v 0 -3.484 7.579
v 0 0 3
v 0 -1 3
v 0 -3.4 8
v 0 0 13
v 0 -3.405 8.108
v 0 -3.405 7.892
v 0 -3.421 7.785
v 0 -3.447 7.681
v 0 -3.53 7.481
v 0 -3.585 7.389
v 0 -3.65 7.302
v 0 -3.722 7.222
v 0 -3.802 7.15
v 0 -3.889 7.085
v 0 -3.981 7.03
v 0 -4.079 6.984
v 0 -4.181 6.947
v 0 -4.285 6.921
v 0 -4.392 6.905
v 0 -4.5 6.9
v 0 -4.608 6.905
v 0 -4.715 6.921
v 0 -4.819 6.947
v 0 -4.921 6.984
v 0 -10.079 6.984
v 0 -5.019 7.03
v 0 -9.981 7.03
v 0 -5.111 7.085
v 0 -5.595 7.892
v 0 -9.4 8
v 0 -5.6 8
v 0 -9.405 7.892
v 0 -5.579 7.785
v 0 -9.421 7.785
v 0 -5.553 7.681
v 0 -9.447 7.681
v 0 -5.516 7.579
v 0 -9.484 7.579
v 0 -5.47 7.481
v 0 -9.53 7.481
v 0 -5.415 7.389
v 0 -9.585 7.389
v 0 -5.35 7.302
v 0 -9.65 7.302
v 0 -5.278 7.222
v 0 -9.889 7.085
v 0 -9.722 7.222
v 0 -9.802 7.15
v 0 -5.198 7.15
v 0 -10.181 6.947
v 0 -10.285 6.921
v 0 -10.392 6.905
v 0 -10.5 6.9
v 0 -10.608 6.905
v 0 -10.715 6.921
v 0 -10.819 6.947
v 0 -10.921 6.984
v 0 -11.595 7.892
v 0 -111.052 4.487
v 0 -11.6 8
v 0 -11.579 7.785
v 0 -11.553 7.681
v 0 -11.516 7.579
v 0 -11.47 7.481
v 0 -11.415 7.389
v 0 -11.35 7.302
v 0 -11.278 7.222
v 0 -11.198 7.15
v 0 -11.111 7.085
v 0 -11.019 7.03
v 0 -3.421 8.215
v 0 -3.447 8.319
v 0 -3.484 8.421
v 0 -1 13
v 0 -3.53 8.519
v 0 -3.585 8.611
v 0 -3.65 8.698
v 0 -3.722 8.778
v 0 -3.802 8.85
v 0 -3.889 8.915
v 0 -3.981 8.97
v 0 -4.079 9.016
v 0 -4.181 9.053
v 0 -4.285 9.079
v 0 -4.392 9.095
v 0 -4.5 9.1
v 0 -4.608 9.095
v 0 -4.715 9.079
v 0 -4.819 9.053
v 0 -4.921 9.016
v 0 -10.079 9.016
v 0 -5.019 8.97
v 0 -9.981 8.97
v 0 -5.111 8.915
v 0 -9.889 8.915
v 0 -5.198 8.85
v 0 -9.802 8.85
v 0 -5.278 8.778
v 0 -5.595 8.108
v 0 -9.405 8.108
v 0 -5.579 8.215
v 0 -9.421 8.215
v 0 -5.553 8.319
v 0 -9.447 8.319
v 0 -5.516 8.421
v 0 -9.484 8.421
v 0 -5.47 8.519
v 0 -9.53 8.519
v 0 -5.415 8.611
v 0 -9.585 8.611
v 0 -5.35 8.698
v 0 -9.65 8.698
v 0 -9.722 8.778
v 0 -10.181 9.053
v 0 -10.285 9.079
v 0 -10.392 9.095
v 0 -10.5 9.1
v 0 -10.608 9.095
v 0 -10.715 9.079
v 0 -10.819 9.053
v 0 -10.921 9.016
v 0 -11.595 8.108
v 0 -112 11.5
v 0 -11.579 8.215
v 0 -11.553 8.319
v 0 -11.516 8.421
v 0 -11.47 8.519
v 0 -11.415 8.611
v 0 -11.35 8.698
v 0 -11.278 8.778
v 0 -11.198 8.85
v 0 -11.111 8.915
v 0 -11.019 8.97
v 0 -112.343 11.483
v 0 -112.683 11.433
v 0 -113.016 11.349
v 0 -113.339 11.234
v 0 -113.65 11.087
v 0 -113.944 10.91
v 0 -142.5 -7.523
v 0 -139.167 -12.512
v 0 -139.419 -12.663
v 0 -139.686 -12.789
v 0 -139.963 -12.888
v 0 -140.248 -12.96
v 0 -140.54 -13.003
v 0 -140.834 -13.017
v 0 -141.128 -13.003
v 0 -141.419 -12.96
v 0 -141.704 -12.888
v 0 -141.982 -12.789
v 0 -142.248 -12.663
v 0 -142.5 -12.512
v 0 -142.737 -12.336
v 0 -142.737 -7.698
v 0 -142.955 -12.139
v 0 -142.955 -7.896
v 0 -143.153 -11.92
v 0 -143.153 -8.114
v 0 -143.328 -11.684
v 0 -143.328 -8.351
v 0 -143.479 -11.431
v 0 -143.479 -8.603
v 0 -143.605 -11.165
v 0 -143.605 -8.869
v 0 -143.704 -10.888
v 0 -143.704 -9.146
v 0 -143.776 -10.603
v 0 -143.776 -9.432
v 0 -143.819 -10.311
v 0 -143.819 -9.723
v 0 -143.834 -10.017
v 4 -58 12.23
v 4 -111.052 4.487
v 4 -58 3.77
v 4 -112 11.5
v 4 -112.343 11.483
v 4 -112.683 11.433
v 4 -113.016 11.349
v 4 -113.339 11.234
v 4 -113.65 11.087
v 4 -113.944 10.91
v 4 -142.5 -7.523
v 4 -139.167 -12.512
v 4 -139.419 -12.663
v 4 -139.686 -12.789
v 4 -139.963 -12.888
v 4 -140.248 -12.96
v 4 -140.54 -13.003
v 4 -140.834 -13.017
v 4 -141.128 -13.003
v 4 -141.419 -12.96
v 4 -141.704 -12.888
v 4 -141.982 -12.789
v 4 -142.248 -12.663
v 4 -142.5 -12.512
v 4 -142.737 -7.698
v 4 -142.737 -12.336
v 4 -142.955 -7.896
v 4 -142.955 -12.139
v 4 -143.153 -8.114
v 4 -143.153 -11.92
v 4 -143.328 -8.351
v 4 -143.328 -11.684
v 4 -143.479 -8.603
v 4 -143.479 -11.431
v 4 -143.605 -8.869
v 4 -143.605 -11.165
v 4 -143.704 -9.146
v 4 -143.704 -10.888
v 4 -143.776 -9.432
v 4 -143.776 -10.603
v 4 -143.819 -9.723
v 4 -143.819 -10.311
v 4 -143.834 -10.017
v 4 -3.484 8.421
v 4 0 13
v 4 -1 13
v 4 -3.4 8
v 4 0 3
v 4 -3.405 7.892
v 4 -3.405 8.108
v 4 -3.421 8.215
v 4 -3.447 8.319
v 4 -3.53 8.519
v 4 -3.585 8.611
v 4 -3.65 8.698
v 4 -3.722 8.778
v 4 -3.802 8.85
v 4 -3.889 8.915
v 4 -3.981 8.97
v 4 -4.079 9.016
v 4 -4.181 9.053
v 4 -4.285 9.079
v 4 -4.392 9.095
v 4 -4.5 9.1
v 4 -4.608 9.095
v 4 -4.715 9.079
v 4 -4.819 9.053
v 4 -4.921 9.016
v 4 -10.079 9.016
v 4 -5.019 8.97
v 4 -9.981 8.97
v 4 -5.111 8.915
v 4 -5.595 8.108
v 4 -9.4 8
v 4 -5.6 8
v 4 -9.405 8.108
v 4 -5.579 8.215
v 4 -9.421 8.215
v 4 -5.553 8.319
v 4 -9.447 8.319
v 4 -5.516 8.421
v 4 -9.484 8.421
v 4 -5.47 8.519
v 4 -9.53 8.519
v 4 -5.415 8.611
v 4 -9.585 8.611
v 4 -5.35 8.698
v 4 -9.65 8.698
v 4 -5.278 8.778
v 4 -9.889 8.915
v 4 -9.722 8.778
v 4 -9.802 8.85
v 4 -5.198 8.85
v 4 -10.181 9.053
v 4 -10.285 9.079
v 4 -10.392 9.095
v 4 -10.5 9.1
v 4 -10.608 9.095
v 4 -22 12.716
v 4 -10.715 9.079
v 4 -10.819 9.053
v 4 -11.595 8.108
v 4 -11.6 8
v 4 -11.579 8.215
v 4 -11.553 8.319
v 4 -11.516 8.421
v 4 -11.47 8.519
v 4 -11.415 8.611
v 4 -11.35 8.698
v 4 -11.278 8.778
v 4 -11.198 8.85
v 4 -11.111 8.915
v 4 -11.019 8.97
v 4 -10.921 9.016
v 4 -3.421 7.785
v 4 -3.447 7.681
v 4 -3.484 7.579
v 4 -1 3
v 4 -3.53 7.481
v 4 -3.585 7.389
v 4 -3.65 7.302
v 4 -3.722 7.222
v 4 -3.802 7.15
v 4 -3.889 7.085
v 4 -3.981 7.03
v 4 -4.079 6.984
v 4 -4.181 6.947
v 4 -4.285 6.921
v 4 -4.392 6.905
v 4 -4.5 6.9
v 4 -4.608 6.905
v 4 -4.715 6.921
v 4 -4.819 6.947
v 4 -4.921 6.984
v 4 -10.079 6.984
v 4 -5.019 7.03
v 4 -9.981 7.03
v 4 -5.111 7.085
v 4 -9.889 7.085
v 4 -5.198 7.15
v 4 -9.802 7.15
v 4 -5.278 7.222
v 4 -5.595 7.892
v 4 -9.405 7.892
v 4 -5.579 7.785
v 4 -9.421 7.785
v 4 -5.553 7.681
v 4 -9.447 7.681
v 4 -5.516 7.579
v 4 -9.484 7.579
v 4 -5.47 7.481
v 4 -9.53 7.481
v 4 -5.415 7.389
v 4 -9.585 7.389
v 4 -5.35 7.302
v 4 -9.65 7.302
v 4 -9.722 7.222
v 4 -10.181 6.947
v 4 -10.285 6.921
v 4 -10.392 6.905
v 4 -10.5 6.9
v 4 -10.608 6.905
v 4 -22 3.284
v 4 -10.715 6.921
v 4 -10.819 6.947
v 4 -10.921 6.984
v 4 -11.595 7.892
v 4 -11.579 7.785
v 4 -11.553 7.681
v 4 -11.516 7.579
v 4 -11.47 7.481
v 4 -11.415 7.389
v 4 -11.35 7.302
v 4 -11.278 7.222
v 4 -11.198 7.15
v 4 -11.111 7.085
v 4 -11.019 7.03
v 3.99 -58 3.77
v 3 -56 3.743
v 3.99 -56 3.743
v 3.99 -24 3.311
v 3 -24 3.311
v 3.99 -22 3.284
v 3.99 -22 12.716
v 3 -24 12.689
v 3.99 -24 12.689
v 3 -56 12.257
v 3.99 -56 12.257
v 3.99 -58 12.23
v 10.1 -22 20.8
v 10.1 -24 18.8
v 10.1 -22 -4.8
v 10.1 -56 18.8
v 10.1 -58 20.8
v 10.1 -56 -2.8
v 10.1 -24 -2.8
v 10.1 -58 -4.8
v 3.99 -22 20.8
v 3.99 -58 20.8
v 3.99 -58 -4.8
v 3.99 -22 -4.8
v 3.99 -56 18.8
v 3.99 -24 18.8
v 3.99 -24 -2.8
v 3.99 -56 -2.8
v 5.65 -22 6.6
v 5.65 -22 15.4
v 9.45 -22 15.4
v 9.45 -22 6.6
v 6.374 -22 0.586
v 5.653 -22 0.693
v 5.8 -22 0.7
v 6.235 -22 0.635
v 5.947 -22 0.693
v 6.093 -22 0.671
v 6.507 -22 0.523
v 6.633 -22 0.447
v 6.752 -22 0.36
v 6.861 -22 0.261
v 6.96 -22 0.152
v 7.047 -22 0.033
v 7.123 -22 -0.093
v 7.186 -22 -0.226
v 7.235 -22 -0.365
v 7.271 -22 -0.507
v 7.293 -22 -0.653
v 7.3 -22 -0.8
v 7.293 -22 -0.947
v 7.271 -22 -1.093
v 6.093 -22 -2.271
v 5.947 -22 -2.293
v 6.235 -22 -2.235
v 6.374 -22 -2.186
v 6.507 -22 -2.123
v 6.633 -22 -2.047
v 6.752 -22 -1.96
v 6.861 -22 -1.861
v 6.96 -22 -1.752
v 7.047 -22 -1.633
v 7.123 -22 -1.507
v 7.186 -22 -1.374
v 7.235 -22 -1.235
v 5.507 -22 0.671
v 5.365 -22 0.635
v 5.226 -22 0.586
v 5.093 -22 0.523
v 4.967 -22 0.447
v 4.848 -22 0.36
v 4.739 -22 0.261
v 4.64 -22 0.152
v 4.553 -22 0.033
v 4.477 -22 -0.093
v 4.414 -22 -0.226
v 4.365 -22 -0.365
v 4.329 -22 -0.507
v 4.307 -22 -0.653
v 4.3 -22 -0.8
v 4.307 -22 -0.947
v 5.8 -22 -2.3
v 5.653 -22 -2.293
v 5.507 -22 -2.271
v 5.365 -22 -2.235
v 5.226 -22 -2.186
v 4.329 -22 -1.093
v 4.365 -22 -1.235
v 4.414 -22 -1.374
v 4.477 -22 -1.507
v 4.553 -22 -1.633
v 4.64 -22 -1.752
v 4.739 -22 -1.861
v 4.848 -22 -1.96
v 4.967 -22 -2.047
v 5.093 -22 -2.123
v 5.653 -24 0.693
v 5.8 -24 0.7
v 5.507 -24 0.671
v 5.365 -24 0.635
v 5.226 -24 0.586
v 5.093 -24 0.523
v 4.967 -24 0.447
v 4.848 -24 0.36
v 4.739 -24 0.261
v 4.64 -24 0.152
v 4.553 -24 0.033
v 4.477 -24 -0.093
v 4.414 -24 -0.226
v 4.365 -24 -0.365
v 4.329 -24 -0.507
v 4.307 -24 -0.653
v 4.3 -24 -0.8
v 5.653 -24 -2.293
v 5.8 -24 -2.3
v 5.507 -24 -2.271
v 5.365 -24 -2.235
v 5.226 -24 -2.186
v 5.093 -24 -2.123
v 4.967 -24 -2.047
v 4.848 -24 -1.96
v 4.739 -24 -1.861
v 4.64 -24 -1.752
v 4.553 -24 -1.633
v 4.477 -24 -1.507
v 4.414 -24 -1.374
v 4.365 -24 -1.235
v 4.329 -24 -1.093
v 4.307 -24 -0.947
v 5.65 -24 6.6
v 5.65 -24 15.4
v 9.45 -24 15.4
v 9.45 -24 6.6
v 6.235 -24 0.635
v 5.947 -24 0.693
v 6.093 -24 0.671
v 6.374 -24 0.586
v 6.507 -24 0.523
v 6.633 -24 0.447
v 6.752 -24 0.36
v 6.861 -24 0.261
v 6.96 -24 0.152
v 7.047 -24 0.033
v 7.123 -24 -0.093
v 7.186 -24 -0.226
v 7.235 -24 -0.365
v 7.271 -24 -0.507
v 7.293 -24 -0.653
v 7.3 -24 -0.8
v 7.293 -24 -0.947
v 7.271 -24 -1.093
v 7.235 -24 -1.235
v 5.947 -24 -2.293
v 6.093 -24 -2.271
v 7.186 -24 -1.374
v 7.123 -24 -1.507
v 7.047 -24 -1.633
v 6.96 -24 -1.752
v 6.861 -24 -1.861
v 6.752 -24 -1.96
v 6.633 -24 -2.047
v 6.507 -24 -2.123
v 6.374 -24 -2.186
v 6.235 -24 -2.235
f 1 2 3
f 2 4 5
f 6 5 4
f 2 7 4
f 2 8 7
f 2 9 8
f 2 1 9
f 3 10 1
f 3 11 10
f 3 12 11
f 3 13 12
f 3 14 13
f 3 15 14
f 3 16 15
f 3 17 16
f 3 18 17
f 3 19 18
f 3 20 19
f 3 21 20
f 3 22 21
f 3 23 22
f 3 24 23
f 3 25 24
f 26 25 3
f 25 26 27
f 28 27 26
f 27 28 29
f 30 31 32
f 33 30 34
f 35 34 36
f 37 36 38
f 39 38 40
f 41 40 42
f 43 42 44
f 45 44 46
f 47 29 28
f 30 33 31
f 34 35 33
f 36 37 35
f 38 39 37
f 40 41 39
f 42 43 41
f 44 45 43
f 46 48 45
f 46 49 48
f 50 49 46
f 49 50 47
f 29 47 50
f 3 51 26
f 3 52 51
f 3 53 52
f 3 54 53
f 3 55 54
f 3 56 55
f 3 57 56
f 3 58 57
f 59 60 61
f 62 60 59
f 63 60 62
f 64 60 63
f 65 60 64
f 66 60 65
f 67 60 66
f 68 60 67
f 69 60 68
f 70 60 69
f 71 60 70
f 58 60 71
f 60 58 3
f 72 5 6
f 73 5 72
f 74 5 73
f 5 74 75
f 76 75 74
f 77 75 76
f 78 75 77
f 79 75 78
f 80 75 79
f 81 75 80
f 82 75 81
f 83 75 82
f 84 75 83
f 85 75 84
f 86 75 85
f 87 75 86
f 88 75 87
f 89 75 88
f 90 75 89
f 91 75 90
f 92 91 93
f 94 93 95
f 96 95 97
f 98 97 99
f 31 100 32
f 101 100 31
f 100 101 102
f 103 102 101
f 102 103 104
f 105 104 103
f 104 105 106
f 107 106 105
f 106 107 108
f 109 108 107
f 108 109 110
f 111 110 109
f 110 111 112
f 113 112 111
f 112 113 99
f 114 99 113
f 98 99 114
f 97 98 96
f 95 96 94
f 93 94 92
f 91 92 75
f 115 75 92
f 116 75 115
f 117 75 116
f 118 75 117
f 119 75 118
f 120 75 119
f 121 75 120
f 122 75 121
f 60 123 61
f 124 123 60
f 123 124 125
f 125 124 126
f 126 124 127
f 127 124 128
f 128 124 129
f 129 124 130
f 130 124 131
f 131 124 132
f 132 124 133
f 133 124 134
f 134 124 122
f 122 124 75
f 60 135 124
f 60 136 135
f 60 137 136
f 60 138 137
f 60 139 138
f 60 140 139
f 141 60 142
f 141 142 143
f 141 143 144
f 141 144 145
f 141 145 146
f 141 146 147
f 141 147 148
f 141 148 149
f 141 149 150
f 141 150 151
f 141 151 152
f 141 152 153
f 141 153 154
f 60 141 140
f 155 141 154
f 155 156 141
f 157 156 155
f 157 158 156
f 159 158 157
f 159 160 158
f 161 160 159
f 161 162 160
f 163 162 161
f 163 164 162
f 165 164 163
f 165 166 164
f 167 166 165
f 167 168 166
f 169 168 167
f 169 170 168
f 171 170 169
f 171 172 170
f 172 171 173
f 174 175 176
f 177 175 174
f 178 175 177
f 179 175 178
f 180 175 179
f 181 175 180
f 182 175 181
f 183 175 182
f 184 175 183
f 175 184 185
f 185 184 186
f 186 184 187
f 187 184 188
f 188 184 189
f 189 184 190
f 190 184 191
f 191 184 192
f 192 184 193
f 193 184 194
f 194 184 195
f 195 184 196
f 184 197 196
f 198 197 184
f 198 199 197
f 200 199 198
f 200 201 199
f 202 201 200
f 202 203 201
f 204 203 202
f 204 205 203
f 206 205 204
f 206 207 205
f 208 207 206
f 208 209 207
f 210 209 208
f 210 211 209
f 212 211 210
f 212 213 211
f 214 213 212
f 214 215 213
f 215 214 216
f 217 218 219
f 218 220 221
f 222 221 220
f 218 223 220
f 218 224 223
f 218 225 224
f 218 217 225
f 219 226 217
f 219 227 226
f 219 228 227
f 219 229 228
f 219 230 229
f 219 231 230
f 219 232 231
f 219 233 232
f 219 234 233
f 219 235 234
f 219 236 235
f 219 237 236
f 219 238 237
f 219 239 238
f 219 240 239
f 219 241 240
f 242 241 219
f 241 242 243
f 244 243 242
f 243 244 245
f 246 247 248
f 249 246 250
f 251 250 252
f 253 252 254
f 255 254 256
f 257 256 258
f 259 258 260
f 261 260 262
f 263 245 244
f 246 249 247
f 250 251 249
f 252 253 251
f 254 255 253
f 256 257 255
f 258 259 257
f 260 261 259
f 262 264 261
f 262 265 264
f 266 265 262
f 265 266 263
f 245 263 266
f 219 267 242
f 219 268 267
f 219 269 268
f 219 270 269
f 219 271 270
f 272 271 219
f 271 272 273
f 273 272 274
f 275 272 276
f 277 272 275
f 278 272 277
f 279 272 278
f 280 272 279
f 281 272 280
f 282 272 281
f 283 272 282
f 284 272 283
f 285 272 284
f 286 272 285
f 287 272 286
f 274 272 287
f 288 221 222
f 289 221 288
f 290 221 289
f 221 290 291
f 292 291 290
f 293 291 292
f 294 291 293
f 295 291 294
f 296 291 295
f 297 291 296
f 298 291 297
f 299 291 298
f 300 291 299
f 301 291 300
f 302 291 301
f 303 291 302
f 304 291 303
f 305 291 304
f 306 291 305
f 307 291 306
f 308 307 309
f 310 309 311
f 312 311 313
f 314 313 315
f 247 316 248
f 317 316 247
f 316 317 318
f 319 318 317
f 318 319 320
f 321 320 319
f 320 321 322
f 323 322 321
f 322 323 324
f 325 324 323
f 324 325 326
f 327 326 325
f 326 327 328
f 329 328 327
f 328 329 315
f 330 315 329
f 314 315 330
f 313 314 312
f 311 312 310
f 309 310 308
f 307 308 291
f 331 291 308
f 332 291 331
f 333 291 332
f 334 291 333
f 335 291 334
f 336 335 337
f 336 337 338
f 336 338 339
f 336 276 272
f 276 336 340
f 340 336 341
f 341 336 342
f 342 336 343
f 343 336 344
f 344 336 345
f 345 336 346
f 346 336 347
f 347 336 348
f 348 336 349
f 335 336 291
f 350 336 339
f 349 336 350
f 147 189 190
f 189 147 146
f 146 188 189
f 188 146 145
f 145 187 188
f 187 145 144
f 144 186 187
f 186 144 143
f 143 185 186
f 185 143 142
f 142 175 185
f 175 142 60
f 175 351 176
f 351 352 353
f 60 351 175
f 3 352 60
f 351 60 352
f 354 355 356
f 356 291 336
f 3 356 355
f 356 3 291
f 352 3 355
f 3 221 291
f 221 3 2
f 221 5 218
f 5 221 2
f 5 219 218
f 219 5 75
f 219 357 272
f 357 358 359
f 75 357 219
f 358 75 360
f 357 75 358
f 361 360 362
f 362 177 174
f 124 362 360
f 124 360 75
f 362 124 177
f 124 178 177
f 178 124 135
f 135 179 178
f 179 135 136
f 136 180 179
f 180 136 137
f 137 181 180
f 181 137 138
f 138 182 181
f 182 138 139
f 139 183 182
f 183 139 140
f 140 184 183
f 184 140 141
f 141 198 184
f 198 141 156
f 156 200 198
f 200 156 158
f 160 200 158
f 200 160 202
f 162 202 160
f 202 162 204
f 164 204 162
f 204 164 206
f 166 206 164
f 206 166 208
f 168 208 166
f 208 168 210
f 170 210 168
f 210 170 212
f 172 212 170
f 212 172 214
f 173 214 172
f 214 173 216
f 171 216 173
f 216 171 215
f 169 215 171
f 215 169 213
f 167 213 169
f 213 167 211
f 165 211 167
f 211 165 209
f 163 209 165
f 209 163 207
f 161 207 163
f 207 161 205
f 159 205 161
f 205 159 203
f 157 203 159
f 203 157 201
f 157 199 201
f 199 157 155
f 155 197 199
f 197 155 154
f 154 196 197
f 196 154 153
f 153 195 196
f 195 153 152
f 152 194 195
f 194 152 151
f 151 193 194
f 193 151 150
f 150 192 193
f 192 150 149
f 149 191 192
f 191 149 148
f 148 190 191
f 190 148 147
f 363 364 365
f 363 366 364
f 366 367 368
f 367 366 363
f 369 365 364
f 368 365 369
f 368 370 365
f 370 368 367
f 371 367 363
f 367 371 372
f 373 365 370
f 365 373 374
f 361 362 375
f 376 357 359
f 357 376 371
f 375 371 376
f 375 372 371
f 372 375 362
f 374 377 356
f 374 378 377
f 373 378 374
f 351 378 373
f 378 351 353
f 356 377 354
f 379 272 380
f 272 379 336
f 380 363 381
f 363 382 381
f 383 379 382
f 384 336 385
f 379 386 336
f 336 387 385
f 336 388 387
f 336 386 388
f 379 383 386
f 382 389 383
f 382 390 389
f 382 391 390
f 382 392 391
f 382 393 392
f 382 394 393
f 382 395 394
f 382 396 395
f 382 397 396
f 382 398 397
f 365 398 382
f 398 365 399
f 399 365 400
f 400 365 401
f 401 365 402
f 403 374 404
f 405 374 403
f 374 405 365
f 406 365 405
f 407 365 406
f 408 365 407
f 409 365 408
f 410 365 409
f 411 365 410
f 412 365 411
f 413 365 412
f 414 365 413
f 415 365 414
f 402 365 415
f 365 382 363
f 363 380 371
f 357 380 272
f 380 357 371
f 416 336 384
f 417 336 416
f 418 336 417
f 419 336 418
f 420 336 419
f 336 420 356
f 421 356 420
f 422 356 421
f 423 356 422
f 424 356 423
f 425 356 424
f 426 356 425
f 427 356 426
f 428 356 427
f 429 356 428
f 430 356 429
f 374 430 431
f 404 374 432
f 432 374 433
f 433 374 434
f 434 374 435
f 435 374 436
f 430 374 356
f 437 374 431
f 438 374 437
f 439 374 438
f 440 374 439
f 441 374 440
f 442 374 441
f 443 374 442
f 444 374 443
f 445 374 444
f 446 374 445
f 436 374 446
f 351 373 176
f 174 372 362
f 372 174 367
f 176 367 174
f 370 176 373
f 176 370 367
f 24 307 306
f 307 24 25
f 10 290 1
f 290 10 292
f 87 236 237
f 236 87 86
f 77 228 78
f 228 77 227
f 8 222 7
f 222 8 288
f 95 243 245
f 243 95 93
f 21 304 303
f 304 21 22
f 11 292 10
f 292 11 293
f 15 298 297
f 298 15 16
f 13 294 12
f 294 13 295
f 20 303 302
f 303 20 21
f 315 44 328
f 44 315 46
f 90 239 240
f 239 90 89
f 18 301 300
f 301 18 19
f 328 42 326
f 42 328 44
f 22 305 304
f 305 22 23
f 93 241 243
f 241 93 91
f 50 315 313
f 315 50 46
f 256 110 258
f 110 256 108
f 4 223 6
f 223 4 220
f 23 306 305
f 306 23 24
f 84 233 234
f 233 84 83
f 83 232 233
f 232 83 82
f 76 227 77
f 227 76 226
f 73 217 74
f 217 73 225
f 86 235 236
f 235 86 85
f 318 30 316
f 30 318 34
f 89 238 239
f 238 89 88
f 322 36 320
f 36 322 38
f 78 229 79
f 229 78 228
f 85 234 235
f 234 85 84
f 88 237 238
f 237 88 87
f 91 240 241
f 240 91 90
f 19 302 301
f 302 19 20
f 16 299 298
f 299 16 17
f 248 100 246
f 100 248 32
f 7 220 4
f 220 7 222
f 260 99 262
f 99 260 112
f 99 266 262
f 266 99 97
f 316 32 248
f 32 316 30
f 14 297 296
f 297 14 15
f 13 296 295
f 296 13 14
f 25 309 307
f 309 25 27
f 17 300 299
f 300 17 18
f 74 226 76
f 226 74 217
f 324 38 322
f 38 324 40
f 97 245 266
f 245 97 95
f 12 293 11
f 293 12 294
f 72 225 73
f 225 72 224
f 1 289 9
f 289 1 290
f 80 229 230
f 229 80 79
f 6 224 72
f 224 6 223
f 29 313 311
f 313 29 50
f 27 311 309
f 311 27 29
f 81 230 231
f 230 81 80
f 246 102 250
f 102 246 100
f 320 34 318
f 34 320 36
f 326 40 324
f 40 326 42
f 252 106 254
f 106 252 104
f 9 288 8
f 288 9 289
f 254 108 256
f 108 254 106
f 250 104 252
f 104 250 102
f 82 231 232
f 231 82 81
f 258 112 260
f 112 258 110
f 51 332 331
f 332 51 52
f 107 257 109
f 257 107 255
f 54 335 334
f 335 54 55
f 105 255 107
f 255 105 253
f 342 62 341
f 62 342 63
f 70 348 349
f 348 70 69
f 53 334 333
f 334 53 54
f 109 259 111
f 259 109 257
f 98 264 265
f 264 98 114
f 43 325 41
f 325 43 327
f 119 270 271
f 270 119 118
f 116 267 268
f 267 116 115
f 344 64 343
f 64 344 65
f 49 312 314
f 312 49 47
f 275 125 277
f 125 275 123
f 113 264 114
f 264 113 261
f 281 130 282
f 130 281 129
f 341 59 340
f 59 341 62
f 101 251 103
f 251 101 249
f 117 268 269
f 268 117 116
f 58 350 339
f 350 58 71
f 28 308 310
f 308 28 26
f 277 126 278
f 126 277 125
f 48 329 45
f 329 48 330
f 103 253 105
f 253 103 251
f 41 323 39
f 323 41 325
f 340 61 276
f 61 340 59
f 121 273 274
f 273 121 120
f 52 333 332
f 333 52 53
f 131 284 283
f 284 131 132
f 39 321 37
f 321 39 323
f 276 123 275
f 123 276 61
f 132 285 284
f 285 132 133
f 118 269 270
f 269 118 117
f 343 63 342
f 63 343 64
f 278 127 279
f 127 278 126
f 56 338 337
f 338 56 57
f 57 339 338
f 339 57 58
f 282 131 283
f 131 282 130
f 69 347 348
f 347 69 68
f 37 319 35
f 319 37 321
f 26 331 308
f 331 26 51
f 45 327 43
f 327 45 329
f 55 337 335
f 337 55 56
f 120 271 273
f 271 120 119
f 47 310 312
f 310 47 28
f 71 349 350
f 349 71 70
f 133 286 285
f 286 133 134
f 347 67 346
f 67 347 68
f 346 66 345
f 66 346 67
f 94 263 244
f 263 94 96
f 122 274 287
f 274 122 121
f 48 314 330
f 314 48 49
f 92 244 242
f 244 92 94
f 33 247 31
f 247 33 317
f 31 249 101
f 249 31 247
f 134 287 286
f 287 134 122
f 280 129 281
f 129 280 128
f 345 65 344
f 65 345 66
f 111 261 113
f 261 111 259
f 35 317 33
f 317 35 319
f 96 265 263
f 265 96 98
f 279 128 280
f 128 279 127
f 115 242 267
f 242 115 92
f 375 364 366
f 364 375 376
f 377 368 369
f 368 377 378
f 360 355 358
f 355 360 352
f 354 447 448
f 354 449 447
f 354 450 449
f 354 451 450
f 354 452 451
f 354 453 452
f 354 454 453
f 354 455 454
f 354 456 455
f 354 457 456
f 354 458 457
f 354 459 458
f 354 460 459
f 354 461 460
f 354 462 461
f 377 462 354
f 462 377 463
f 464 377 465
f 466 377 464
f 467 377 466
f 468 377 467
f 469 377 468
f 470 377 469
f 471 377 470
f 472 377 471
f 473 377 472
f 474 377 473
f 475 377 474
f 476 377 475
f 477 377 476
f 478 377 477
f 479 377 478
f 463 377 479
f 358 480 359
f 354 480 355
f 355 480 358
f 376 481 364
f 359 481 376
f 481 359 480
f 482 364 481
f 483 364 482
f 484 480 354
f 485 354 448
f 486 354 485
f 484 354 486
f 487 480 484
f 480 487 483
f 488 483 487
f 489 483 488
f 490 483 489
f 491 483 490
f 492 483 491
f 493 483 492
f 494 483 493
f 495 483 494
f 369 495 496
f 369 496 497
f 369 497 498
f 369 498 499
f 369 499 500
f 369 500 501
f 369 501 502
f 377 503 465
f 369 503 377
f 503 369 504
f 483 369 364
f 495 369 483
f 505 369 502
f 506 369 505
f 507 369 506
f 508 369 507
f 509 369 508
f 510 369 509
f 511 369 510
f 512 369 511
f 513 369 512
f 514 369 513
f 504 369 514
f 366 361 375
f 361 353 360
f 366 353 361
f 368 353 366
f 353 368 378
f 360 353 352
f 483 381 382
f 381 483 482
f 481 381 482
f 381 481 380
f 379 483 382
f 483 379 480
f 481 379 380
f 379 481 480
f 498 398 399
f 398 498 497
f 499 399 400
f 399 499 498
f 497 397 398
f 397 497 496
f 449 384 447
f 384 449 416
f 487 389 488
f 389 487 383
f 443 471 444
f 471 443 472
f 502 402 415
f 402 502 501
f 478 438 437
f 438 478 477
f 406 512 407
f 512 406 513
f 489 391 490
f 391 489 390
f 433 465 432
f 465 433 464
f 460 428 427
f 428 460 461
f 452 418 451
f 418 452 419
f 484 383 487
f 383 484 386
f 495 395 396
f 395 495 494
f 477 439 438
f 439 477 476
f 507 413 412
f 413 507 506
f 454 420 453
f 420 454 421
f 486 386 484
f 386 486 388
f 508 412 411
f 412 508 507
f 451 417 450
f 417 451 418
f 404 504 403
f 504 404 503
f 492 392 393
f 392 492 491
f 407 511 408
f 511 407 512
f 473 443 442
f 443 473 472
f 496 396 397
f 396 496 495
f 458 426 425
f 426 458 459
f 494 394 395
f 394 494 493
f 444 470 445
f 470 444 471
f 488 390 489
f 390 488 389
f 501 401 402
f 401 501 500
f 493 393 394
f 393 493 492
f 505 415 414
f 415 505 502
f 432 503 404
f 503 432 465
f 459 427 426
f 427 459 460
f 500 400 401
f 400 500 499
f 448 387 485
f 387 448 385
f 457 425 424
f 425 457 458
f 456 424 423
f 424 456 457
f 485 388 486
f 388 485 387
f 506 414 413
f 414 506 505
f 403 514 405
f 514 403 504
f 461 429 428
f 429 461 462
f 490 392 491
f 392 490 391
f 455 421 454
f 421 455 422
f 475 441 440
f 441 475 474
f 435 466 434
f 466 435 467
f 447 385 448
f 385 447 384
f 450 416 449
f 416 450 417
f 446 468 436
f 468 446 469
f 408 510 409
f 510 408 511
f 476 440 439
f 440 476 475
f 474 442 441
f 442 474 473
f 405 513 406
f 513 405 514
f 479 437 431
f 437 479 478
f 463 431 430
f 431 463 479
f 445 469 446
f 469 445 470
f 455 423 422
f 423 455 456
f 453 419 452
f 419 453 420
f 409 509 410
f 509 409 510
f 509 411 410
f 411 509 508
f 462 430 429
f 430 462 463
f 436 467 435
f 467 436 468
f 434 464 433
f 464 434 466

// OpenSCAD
// file: lib.scad
// Small helpers shared by the parts.

module rounded_square(w, h, r) {
  r2 = min(r, w / 2 - 0.01, h / 2 - 0.01);
  offset(r = r2) square([w - 2 * r2, h - 2 * r2], center = true);
}

// A plate in the x-z plane between y = y0 and y = y0 + t, from a 2D shape drawn in (x, z).
module xz_plate(y0, t) {
  translate([0, y0 + t, 0]) rotate([90, 0, 0]) linear_extrude(t) children();
}

// A plate in the y-z plane between x = x0 and x = x0 + t, from a 2D shape drawn in (y, z).
module yz_plate(x0, t) {
  translate([x0, 0, 0]) rotate([90, 0, 90]) linear_extrude(t) children();
}

// A round hole along x whose top is pointed (45 degrees, cut flat 1 mm above the circle) toward
// +dir so it prints without supports when that axis points up: dir = "y" or "z".
module teardrop_x(d, len, dir = "y") {
  rotate([0, 90, 0]) linear_extrude(len, center = true)
    rotate([0, 0, dir == "y" ? 90 : 0])  // 2D +x below ends up along +dir
      intersection() {
        union() {
          circle(d = d);
          rotate([0, 0, -45]) square(d / 2); // the point, toward 2D +x
        }
        translate([-d, -d]) square([2 * d, 2 * d]);
        translate([-d, -d]) square([d / 2 + 1 + d, 2 * d]);
      }
}
// file: params.scad
// Shared dimensions for the DIY "Reality is yours" glasses. Everything is in mm.
// Wearer coordinates: x = to the wearer's right (+), y = forward toward the world (+), z = up (+).
// The frame front sits between y = 0 (back face, toward the eyes) and y = frame_t; the eyes are
// ~14 mm behind y = 0; the right eye's axis is the line x = ipd/2, z = 0.
//
// Measure your own parts and change these before printing. The ones you should check are marked
// MEASURE; the rest are design choices.

$fn = 64;
clear = 0.3;          // fit clearance for parts that slide into each other (tune for your printer)
m2_hole = 2.2;        // through hole for an M2 screw
m2_tap = 1.7;         // hole an M2 screw self-taps into (plastic)

// ---- face ----
ipd = 63;             // MEASURE: your pupil distance (a ruler in a mirror, or an optician's number)
frame_half_w = 71;    // half the frame width; the temples sit at +-frame_half_w (MEASURE: head width / 2 at the temples, minus 2)
frame_t = 5;          // frame thickness (front to back)

// ---- rims (open; no lenses) ----
rim_w = 40;           // opening width
rim_h = 32;           // opening height
rim_cx = ipd / 2 + 4; // rim center (x): a little outboard of the pupil, as in ordinary glasses
rim_bar = 4.5;        // rim border width
rim_r = 8;            // opening corner radius
rim_outer_w = rim_w + 2 * rim_bar;
rim_outer_h = rim_h + 2 * rim_bar;
bridge_gap = 2 * rim_cx - rim_outer_w;  // space between the rims at the nose (the bridge spans it)
nose_top_w = 16;      // nose notch width at its top (z = nose_top_z)
nose_top_z = 2;
nose_bot_w = 26;      // and at the bottom edge of the frame

// ---- nose pads (printed on the back of the frame) ----
pad_depth = 9;        // how far the pads reach back toward the face
pad_z = -12;          // pad height relative to the eye line

// ---- temples ----
temple_t = 4;         // thickness (x)
temple_h = 10;        // height (z) at the front
temple_z = 8;         // temple centerline height (z)
temple_len = 112;     // straight part, from the frame back face to the ear (MEASURE: frame to the top of your ear)
temple_drop_len = 34; // part that bends down behind the ear
temple_drop_deg = 32;
joint_len = 14;       // how far the frame's joint block reaches back
joint_w = 5;          // joint block width (x)
joint_holes_y = [-4.5, -10.5]; // M2 screw positions along the joint (y)

// ---- wire channel (battery on the left temple -> electronics on the right) ----
wire_w = 2.6;
wire_d = 2;

// ---- optics: OLED -> lens -> 45 degree beam splitter -> right eye ----
// The display faces the nose (-x) on the outer side of the right eye; the splitter in front of the
// eye reflects it back toward the eye (-y) while the world shows through it. One reflection mirrors
// the picture left-right: the firmware flips it (MIRROR_X in config.h).
lens_d = 25;              // MEASURE: lens diameter (Google Cardboard lenses are 25 mm, f ~45 mm)
split_y = frame_t + 2 + lens_d / 2 + 1.5; // optical axis (y): splitter center, lens center, display center
split_w = 25.4;           // MEASURE: beam splitter plate width (the 45 degree side)
split_h = 25.4;           // MEASURE: plate height
split_t = 1.1;            // MEASURE: plate thickness
lens_f = 45;              // MEASURE: lens focal length
lens_edge = 3.5;          // MEASURE: lens edge thickness
lens_gap = 14;            // splitter center -> lens center (x)
// Display -> lens distance: a bit under the focal length puts the picture ~1 m away. The display
// carrier slides +-6 mm around this for focusing.
disp_dist = lens_f * 1000 / (lens_f + 1000);
disp_pcb_w = 44.5;        // MEASURE: display module PCB width (horizontal, along y)
disp_pcb_h = 37.0;        // MEASURE: display module PCB height (z)
disp_pcb_t = 1.6;
disp_active = 27.0;       // MEASURE: visible area (square, 1.5" 128x128 SSD1351)
disp_active_dy = 0;       // MEASURE: visible area center offset from the PCB center (y)
disp_active_dz = 0;       // MEASURE: visible area center offset from the PCB center (z)
disp_parts_t = 5;         // MEASURE: tallest part on the back of the display PCB (pin header etc.)

// ---- lens housing (in front of the right eye; screws to the frame front) ----
wall = 2;
house_x0 = ipd / 2 - split_w / (2 * sqrt(2)) - 2.5 - wall; // nose-side wall
lens_x = ipd / 2 + lens_gap;                     // lens center (x)
house_y0 = frame_t;                              // sits on the frame front
house_y1 = split_y + max(split_w / (2 * sqrt(2)) + 3, lens_d / 2 + 3.4); // front edge
house_hz = rim_outer_h / 2;                      // half height (z), same as the rims
join_x = frame_half_w + 2;                       // where the lens housing meets the display box
lens_plate_t = lens_edge + 3;                    // lens plate thickness (x): 1.5 mm lip + lens + 1.5 mm ring
light_hole = 28;                                 // square light opening between housing and display box
// Frame screw positions (x, z) for the lens housing, clear of the light path (|z| > 14 there).
housing_holes = [[frame_half_w - 2.5, 15.5], [frame_half_w - 5, -18], [lens_x, -rim_outer_h / 2 + rim_bar / 2]];
wire_exit_x = frame_half_w - 8;                  // where the wires pass through the frame to the front

// ---- display box (outboard of the frame; the display slides in it to focus) ----
disp_x_nominal = lens_x + disp_dist;  // display glass (x) at nominal focus
focus_travel = 6;                     // +- range of the display carrier
carrier_t = 2.5;
box_x1 = disp_x_nominal + focus_travel + carrier_t + disp_parts_t + 3;
box_hy = disp_pcb_w / 2 + 0.6 + wall; // half depth (y), centered on the optical axis y = split_y
box_hz = disp_pcb_h / 2 + 0.6 + wall; // half height (z)
join_holes = [[house_y0 + 3, house_hz - 3], [house_y1 - 3, house_hz - 3], [house_y0 + 3, -house_hz + 3], [house_y1 - 3, -house_hz + 3]]; // (y, z)

// ---- electronics pod (on top of the display box): XIAO ESP32S3 Sense + MPU-6050 + 2 buttons ----
pod_in_x = 30;       // inside length (x): XIAO stack is 21 x 17.8
pod_in_y = 25;       // inside depth (y)
pod_in_z = 17;       // MEASURE: XIAO ESP32S3 Sense stacked height incl. the camera flex fold (~15)
pod_x1 = box_x1;     // flush with the display box's outer end (open there; the end cap closes both)
pod_x0 = pod_x1 - pod_in_x - wall;
pod_z0 = box_hz;     // sits on the display box
cam_win = 9;         // camera window (the OV2640 module is ~8.5 mm square)
cam_x = pod_x0 + wall + 8; // camera window center (x): the pod end nearest the eye
button_d = 3.6;      // hole for a 6x6 mm tactile button's plunger
usb_w = 10; usb_h = 5; // USB-C opening in the end cap (MEASURE where your XIAO's port lands)

// ---- battery pod (left temple, outer side) ----
bat_l = 31;          // MEASURE: LiPo length incl. protection board (502030 = 30 mm)
bat_w = 21;          // MEASURE: LiPo width (502030 = 20 mm)
bat_t = 5.5;         // MEASURE: LiPo thickness (502030 = 5 mm)
bat_y0 = -22;        // where the pod starts along the temple (y)
switch_l = 8.8;      // slide switch body (SS12D00 = 8.6 x 3.6)
switch_w = 3.8;
// main file
// Temples. The front end screws onto the frame's joint block (2x M2 from the outside). The left one
// carries the battery pod on its outer side (open on the outside; battery_lid.stl closes it), with
// the power switch in its front wall and the wires leaving toward the frame.
// Print lying on the inner face (as oriented here: x up = away from the head), no supports.
// side = "left" or "right" (export.sh sets it).
include <params.scad>
use <lib.scad>

side = "left";

// Temple profile in (y, z), y = 0 at the frame's back face.
module profile() {
  end = [-temple_len - temple_drop_len * cos(temple_drop_deg), temple_z - temple_drop_len * sin(temple_drop_deg)];
  union() {
    hull() {
      translate([-0.5, temple_z]) square([1, temple_h], center = true);
      translate([-temple_len, temple_z]) circle(d = 7);
    }
    hull() {
      translate([-temple_len, temple_z]) circle(d = 7);
      translate(end) circle(d = 6);
    }
  }
}

pod_l = bat_l + 1 + 2 * wall;
pod_w = bat_w + 0.6 + 2 * wall; // along z
pod_t = bat_t + 0.6;            // inside depth (outward)

// Built for the right side in wearer coordinates with the outer face at x = temple_t;
// mirrored for the left. Placed so the inner face is at x = 0 (print bed).
module temple(left) {
  difference() {
    union() {
      yz_plate(0, temple_t) profile();
      if (left) translate([temple_t - 0.01, bat_y0 - pod_l, temple_z - pod_w / 2]) cube([pod_t + 0.01, pod_l, pod_w]);
    }
    // joint screws (clearance; they self-tap into the frame's joint block)
    for (y = joint_holes_y) translate([temple_t / 2, y, temple_z]) rotate([0, 90, 0]) cylinder(d = m2_hole, h = temple_t + 1, center = true);
    if (left) {
      // battery cavity (open toward +x)
      translate([temple_t - 1, bat_y0 - pod_l + wall, temple_z - pod_w / 2 + wall]) cube([pod_t + 2, pod_l - 2 * wall, pod_w - 2 * wall]);
      // power switch in the front wall
      translate([temple_t + pod_t / 2 + 0.5, bat_y0 - wall / 2, temple_z + 3]) cube([switch_w, wall + 1, switch_l], center = true);
      // wires out toward the frame
      translate([temple_t + 1.8, bat_y0 - wall / 2, temple_z - pod_w / 2 + wall + 2]) rotate([90, 0, 0]) cylinder(d = 3, h = wall + 1, center = true);
    }
  }
}

print = false; // export.sh sets true: inner face down on the bed
if (print) rotate([0, -90, 0]) temple(side == "left"); else temple(side == "left");
